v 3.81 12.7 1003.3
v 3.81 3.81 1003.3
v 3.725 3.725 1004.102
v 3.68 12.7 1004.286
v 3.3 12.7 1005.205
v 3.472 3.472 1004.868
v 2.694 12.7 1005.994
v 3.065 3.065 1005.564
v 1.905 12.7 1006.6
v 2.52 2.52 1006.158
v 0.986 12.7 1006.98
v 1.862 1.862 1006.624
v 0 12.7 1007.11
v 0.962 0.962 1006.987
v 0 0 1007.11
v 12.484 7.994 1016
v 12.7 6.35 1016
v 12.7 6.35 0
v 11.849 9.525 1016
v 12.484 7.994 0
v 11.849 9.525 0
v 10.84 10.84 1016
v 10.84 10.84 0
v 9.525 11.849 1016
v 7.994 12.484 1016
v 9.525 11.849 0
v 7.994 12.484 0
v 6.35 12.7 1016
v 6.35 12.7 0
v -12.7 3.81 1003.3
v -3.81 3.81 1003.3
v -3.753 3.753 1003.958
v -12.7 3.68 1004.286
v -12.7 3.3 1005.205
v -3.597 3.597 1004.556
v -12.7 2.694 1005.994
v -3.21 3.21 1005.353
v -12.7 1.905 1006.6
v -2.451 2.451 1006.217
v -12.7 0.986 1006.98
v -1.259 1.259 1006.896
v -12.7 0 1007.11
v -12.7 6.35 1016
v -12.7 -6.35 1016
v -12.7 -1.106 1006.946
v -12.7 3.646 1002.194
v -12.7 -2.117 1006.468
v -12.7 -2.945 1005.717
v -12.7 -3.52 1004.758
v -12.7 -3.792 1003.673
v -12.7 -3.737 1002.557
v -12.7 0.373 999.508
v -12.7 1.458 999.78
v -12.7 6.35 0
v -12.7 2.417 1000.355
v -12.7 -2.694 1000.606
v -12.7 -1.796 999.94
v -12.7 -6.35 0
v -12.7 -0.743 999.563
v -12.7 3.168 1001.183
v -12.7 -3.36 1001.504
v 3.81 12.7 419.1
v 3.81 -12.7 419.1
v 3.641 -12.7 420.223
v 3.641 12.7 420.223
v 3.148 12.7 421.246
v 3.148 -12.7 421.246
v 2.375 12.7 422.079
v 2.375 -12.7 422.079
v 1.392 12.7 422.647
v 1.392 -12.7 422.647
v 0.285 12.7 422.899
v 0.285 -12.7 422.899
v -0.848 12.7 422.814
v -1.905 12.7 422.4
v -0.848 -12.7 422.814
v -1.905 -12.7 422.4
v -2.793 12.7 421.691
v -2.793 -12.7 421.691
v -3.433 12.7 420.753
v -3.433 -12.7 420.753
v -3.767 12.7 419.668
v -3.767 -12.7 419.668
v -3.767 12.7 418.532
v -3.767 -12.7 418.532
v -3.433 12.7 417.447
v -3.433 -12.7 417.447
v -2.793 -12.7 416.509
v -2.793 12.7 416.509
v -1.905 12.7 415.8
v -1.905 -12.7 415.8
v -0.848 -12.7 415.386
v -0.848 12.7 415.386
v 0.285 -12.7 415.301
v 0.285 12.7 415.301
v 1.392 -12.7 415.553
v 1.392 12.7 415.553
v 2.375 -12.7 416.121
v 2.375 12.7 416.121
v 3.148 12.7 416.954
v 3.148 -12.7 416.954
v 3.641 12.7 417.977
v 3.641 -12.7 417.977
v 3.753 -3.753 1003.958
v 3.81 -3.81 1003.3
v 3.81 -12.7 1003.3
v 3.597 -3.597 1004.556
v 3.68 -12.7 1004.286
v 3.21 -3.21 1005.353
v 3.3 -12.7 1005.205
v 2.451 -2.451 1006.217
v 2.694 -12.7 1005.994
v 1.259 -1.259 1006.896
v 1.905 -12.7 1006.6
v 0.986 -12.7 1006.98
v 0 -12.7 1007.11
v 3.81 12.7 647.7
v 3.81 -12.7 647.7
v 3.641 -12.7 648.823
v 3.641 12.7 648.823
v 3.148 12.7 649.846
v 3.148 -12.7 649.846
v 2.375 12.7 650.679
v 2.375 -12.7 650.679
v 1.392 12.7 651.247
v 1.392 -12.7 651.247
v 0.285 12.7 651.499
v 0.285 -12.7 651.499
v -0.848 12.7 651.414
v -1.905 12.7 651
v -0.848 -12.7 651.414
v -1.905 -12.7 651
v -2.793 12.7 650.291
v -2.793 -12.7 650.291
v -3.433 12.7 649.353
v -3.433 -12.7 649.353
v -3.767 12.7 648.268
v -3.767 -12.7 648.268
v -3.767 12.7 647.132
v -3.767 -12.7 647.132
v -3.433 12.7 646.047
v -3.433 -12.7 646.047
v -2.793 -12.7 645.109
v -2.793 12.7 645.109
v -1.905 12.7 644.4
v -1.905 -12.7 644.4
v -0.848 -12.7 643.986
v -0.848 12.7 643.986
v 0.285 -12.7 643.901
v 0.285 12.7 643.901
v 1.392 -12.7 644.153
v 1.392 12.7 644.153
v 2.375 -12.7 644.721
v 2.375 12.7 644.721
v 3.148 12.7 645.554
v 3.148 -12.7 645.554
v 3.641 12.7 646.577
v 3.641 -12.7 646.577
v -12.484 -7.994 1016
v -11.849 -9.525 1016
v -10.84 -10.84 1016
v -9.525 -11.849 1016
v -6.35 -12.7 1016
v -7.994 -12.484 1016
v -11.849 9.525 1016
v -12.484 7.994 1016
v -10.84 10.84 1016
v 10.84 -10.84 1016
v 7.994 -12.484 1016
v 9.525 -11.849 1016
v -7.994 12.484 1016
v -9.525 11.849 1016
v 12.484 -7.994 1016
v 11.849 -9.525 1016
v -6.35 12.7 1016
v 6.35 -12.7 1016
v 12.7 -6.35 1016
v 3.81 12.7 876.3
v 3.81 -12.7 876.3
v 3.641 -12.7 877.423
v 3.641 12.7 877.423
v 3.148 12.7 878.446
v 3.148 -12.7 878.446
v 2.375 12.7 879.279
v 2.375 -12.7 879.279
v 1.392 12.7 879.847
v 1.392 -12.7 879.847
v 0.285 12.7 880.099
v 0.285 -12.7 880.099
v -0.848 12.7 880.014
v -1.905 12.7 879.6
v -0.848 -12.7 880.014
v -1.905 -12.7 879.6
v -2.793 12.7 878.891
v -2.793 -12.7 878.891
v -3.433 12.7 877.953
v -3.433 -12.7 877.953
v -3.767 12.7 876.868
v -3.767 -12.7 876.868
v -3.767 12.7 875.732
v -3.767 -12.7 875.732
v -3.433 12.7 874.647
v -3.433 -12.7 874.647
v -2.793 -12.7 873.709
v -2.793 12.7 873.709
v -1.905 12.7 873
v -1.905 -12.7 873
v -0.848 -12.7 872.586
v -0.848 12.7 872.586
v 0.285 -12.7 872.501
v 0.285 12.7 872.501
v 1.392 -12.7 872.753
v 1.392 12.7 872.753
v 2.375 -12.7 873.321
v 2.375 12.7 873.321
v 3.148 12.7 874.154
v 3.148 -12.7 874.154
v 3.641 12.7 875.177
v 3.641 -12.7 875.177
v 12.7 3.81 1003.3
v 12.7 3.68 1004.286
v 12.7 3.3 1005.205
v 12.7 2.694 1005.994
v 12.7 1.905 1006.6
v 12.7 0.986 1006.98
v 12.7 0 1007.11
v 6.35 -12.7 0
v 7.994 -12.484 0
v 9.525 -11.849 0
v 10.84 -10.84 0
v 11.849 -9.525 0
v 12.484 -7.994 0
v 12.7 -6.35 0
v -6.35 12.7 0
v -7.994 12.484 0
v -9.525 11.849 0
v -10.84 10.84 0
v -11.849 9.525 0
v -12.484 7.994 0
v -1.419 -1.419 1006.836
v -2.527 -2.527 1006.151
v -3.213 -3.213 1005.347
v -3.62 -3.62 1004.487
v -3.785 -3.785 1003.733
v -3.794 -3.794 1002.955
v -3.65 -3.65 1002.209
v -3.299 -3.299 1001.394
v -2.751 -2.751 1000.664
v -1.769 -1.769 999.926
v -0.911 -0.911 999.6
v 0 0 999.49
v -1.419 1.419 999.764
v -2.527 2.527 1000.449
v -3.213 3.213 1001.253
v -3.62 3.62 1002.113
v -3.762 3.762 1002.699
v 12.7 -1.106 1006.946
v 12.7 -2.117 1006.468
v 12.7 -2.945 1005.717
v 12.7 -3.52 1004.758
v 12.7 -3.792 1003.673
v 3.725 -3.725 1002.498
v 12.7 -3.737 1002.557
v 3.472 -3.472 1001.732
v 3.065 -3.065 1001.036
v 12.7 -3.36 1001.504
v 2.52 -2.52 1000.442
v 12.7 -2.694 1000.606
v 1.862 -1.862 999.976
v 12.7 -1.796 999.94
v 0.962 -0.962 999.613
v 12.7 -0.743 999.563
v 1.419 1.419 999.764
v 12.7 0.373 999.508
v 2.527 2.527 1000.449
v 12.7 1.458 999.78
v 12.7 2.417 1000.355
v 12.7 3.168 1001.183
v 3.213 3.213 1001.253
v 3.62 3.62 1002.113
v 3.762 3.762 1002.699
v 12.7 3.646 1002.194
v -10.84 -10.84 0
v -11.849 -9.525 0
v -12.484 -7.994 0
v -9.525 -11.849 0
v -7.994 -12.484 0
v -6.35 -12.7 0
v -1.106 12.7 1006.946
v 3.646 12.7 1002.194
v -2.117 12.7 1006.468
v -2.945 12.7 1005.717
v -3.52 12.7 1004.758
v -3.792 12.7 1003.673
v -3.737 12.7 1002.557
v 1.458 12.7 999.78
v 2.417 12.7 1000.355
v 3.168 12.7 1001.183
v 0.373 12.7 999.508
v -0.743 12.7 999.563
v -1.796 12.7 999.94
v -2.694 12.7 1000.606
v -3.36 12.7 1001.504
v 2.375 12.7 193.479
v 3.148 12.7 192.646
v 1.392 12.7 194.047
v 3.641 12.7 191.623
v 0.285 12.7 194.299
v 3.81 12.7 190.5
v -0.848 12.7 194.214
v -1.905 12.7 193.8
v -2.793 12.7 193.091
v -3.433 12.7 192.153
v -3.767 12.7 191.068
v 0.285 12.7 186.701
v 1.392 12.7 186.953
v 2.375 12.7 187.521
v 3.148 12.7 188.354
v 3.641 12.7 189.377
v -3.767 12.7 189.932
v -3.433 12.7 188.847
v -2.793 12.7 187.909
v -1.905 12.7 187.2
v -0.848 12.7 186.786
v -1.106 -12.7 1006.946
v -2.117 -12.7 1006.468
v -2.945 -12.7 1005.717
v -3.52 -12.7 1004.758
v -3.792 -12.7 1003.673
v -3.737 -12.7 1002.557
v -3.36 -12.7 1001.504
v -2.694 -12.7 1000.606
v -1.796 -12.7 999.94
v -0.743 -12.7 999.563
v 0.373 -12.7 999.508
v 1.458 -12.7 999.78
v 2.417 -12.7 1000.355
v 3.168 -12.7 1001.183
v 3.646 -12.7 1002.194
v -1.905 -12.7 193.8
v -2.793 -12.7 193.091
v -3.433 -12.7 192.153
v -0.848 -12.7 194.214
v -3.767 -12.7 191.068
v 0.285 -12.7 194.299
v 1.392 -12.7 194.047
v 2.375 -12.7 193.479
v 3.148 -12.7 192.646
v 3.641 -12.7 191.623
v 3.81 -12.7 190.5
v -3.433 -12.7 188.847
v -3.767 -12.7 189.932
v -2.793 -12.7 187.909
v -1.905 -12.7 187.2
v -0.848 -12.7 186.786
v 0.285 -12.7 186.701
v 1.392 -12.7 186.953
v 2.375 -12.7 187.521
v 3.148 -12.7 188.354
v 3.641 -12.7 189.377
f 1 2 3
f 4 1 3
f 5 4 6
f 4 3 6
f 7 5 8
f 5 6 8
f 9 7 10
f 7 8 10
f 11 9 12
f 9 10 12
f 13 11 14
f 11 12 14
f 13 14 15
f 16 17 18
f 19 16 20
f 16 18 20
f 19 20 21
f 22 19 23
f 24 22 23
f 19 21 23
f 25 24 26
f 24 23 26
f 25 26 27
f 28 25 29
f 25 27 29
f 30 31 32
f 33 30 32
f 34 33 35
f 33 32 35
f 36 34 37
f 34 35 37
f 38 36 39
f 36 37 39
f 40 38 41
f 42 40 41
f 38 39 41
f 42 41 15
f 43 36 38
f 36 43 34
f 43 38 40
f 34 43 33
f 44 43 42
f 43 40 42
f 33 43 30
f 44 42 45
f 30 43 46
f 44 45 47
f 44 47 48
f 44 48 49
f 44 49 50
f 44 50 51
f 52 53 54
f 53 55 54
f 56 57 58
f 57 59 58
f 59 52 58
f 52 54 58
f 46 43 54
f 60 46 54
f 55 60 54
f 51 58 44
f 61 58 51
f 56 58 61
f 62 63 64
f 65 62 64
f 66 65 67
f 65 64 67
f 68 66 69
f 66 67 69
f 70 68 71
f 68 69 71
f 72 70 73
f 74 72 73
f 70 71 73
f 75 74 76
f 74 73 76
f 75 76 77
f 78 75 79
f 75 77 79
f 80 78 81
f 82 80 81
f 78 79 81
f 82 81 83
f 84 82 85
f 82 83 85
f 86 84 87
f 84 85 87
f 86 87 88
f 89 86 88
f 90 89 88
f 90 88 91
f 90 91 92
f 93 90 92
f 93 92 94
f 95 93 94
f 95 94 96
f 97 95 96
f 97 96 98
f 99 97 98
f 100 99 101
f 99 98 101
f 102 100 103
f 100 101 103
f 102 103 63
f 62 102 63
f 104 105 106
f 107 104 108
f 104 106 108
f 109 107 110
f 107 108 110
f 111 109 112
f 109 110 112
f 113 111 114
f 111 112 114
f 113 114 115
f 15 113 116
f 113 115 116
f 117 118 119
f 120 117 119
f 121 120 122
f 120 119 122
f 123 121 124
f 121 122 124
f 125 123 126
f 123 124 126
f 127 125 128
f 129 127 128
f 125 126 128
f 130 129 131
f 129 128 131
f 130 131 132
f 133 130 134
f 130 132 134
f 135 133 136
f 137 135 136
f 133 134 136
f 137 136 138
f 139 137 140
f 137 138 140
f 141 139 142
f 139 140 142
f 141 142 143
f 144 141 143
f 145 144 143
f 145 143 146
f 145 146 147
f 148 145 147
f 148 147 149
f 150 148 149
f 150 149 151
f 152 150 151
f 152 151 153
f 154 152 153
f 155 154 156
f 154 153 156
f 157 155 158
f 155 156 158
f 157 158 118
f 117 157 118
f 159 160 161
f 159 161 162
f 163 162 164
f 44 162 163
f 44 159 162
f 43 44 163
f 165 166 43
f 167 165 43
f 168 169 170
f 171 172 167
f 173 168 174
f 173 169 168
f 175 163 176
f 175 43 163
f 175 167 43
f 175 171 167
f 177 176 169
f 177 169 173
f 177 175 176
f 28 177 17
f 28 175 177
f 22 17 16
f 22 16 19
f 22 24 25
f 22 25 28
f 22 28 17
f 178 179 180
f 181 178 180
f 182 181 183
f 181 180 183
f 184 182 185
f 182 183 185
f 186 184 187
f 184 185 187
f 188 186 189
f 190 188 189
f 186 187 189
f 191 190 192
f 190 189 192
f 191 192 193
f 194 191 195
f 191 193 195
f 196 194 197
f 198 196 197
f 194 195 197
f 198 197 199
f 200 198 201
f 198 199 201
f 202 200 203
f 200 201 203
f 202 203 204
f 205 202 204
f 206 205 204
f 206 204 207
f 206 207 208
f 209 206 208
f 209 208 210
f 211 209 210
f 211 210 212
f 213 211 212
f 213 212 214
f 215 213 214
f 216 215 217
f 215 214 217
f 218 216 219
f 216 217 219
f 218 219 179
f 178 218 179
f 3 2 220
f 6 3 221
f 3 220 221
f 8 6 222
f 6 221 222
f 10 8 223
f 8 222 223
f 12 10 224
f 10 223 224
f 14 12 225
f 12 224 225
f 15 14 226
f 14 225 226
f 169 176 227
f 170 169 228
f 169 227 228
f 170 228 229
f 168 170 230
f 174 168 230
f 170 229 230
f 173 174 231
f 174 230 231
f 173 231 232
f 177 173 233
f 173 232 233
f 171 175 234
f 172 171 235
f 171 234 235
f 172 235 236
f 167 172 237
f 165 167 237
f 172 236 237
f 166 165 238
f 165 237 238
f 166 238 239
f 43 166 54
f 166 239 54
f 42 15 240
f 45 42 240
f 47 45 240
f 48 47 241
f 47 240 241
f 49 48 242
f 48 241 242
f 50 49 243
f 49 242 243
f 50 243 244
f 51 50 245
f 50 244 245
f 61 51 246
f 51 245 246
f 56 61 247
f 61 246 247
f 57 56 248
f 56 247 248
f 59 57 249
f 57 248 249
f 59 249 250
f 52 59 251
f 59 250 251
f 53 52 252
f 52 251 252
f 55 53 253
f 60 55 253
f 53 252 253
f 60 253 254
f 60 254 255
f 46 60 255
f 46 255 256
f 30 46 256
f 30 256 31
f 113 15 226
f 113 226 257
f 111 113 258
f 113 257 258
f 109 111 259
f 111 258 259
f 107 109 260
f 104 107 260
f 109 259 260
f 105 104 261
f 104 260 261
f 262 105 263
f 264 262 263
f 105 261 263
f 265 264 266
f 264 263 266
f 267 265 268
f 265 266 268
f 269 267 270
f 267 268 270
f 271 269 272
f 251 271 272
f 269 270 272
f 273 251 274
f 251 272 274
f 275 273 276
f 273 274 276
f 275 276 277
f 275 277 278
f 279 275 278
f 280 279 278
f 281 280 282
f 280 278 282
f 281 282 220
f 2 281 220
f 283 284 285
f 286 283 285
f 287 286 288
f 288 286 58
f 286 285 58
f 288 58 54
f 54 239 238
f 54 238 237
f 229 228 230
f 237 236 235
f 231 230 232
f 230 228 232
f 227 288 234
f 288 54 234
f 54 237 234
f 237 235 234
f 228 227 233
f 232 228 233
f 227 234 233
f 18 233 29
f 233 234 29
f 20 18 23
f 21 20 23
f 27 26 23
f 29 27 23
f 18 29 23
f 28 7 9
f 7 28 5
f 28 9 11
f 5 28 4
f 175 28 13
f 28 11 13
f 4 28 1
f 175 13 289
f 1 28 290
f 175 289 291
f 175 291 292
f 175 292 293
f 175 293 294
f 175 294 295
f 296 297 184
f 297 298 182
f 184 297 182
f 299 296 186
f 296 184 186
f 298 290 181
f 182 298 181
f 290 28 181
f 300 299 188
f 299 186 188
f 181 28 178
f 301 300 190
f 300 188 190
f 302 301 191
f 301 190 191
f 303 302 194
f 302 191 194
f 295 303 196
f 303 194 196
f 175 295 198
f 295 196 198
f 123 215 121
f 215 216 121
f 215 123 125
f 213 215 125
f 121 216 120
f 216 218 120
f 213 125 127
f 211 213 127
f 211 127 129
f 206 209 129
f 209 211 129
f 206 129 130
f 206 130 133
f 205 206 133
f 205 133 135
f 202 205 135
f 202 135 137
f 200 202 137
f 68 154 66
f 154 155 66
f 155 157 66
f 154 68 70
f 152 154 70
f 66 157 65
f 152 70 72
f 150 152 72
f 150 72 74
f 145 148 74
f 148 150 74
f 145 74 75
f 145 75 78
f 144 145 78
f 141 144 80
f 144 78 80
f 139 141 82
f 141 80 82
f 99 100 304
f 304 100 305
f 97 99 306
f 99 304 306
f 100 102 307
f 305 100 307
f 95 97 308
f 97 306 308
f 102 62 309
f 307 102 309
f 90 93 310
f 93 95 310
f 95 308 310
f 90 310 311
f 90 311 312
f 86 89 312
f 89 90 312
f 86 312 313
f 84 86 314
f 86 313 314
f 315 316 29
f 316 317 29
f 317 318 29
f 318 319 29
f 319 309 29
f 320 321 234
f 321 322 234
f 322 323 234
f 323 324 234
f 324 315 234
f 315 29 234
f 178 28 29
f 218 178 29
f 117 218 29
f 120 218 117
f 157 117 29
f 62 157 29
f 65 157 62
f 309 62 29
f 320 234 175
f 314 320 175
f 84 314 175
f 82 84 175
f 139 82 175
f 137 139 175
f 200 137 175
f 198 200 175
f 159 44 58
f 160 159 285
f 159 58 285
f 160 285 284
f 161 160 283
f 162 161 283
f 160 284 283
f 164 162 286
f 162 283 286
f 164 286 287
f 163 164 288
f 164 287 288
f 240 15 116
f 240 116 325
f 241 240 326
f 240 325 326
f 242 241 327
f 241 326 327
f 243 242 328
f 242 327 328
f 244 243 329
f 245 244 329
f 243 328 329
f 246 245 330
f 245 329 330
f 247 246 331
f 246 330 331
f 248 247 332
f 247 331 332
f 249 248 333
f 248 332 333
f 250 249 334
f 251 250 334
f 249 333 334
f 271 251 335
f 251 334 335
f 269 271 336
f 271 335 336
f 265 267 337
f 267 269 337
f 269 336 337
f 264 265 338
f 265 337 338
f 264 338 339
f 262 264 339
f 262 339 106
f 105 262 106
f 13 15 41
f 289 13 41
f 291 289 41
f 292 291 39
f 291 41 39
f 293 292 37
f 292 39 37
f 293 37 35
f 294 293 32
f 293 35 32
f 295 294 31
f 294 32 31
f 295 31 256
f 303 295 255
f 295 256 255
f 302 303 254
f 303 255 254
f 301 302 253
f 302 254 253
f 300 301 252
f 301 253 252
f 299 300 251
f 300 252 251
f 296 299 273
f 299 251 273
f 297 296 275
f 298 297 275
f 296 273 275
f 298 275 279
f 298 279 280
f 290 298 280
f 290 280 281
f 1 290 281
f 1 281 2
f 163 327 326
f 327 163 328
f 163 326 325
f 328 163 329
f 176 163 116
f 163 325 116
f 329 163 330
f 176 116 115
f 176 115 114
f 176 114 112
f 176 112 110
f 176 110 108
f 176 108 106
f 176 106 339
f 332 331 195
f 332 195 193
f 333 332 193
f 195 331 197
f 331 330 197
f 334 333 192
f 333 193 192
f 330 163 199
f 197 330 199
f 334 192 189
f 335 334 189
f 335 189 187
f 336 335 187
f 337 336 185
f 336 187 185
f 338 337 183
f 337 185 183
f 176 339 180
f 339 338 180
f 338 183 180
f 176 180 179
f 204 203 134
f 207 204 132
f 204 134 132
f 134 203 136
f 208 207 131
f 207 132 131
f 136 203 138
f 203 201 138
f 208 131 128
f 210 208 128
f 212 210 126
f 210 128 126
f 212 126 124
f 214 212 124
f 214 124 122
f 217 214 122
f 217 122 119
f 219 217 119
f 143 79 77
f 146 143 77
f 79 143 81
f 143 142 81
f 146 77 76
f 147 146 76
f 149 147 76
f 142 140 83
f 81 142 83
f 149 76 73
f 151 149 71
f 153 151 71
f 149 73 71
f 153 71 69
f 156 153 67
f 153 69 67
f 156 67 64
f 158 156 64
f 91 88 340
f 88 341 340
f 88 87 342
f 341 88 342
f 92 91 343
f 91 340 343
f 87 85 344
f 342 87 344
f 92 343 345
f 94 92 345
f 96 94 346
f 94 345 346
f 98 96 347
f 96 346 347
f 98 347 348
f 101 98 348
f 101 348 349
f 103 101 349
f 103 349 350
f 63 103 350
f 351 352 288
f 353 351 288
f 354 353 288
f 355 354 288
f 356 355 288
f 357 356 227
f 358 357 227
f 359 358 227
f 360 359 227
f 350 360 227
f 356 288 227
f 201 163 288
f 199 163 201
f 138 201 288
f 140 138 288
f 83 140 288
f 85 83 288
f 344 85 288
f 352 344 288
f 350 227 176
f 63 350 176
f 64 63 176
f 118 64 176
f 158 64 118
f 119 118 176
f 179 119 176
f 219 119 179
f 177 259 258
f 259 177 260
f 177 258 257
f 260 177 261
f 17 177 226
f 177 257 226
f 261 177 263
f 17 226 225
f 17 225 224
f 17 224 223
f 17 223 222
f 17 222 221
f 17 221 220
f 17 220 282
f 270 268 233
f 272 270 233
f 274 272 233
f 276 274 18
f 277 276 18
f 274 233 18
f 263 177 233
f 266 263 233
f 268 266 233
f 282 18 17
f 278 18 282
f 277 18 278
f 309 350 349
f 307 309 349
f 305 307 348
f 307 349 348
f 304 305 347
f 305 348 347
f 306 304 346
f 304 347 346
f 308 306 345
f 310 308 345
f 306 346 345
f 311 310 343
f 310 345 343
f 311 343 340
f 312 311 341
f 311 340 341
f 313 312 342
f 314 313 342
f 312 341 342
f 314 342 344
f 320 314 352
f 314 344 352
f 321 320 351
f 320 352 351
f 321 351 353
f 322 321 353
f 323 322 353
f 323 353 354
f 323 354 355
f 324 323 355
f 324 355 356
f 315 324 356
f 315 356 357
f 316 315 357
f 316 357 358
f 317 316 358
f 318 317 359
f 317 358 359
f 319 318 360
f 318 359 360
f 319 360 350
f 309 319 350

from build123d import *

# Parameters (mm, degrees)
F1_DEPTH = 1016
F4_DEPTH = 25.4
F2_R     = 3.81
F5_DEPTH = 25.4
F6_DEPTH = 25.4


# Not quite as in the source:
# - a feature names something its author has since deleted; it is built from what else it names


with BuildPart() as f1:
    # F0 (on Top) → F1 (new body)
    with BuildSketch(Plane.XY):
        with BuildLine():
            ThreePointArc((12.7, 6.35), (10.8401280605, 10.8401280605), (6.35, 12.7))
            Line((6.35, 12.7), (-6.35, 12.7))
            ThreePointArc((-6.35, 12.7), (-10.8401280605, 10.8401280605), (-12.7, 6.35))
            Line((-12.7, 6.35), (-12.7, -6.35))
            ThreePointArc((-12.7, -6.35), (-10.8401280605, -10.8401280605), (-6.35, -12.7))
            Line((-6.35, -12.7), (6.35, -12.7))
            ThreePointArc((6.35, -12.7), (10.8401280605, -10.8401280605), (12.7, -6.35))
            Line((12.7, -6.35), (12.7, 6.35))
        make_face()
    extrude(amount=F1_DEPTH)

    # F3 (on face) → F4 (cut)
    with BuildSketch(Plane.YZ.offset(12.7)):
        with BuildLine():
            ThreePointArc((3.81, 1003.3), (2.6940768363, 1005.9940768363), (0, 1007.11))
            ThreePointArc((0, 1007.11), (-2.6940768363, 1000.6059231637), (3.81, 1003.3))
        make_face()
    extrude(amount=-F4_DEPTH, mode=Mode.SUBTRACT)

    # F2 (on face) → F5 (cut)
    with BuildSketch(Plane.XZ.offset(12.7)):
        with BuildLine():
            ThreePointArc((3.81, 1003.3), (2.6940768363, 1005.9940768363), (0, 1007.11))
            ThreePointArc((0, 1007.11), (-2.6940768363, 1000.6059231637), (3.81, 1003.3))
        make_face()
        with Locations((0, 876.3)):
            Circle(F2_R)
        with Locations((0, 647.7)):
            Circle(F2_R)
        with Locations((0, 419.1)):
            Circle(F2_R)
    extrude(amount=-F5_DEPTH, mode=Mode.SUBTRACT)

    # F2 (on face) → F6 (cut)
    with BuildSketch(Plane.XZ.offset(12.7)):
        with Locations((0, 190.5)):
            Circle(F2_R)
    extrude(amount=-F6_DEPTH, mode=Mode.SUBTRACT)


solid = f1.part
